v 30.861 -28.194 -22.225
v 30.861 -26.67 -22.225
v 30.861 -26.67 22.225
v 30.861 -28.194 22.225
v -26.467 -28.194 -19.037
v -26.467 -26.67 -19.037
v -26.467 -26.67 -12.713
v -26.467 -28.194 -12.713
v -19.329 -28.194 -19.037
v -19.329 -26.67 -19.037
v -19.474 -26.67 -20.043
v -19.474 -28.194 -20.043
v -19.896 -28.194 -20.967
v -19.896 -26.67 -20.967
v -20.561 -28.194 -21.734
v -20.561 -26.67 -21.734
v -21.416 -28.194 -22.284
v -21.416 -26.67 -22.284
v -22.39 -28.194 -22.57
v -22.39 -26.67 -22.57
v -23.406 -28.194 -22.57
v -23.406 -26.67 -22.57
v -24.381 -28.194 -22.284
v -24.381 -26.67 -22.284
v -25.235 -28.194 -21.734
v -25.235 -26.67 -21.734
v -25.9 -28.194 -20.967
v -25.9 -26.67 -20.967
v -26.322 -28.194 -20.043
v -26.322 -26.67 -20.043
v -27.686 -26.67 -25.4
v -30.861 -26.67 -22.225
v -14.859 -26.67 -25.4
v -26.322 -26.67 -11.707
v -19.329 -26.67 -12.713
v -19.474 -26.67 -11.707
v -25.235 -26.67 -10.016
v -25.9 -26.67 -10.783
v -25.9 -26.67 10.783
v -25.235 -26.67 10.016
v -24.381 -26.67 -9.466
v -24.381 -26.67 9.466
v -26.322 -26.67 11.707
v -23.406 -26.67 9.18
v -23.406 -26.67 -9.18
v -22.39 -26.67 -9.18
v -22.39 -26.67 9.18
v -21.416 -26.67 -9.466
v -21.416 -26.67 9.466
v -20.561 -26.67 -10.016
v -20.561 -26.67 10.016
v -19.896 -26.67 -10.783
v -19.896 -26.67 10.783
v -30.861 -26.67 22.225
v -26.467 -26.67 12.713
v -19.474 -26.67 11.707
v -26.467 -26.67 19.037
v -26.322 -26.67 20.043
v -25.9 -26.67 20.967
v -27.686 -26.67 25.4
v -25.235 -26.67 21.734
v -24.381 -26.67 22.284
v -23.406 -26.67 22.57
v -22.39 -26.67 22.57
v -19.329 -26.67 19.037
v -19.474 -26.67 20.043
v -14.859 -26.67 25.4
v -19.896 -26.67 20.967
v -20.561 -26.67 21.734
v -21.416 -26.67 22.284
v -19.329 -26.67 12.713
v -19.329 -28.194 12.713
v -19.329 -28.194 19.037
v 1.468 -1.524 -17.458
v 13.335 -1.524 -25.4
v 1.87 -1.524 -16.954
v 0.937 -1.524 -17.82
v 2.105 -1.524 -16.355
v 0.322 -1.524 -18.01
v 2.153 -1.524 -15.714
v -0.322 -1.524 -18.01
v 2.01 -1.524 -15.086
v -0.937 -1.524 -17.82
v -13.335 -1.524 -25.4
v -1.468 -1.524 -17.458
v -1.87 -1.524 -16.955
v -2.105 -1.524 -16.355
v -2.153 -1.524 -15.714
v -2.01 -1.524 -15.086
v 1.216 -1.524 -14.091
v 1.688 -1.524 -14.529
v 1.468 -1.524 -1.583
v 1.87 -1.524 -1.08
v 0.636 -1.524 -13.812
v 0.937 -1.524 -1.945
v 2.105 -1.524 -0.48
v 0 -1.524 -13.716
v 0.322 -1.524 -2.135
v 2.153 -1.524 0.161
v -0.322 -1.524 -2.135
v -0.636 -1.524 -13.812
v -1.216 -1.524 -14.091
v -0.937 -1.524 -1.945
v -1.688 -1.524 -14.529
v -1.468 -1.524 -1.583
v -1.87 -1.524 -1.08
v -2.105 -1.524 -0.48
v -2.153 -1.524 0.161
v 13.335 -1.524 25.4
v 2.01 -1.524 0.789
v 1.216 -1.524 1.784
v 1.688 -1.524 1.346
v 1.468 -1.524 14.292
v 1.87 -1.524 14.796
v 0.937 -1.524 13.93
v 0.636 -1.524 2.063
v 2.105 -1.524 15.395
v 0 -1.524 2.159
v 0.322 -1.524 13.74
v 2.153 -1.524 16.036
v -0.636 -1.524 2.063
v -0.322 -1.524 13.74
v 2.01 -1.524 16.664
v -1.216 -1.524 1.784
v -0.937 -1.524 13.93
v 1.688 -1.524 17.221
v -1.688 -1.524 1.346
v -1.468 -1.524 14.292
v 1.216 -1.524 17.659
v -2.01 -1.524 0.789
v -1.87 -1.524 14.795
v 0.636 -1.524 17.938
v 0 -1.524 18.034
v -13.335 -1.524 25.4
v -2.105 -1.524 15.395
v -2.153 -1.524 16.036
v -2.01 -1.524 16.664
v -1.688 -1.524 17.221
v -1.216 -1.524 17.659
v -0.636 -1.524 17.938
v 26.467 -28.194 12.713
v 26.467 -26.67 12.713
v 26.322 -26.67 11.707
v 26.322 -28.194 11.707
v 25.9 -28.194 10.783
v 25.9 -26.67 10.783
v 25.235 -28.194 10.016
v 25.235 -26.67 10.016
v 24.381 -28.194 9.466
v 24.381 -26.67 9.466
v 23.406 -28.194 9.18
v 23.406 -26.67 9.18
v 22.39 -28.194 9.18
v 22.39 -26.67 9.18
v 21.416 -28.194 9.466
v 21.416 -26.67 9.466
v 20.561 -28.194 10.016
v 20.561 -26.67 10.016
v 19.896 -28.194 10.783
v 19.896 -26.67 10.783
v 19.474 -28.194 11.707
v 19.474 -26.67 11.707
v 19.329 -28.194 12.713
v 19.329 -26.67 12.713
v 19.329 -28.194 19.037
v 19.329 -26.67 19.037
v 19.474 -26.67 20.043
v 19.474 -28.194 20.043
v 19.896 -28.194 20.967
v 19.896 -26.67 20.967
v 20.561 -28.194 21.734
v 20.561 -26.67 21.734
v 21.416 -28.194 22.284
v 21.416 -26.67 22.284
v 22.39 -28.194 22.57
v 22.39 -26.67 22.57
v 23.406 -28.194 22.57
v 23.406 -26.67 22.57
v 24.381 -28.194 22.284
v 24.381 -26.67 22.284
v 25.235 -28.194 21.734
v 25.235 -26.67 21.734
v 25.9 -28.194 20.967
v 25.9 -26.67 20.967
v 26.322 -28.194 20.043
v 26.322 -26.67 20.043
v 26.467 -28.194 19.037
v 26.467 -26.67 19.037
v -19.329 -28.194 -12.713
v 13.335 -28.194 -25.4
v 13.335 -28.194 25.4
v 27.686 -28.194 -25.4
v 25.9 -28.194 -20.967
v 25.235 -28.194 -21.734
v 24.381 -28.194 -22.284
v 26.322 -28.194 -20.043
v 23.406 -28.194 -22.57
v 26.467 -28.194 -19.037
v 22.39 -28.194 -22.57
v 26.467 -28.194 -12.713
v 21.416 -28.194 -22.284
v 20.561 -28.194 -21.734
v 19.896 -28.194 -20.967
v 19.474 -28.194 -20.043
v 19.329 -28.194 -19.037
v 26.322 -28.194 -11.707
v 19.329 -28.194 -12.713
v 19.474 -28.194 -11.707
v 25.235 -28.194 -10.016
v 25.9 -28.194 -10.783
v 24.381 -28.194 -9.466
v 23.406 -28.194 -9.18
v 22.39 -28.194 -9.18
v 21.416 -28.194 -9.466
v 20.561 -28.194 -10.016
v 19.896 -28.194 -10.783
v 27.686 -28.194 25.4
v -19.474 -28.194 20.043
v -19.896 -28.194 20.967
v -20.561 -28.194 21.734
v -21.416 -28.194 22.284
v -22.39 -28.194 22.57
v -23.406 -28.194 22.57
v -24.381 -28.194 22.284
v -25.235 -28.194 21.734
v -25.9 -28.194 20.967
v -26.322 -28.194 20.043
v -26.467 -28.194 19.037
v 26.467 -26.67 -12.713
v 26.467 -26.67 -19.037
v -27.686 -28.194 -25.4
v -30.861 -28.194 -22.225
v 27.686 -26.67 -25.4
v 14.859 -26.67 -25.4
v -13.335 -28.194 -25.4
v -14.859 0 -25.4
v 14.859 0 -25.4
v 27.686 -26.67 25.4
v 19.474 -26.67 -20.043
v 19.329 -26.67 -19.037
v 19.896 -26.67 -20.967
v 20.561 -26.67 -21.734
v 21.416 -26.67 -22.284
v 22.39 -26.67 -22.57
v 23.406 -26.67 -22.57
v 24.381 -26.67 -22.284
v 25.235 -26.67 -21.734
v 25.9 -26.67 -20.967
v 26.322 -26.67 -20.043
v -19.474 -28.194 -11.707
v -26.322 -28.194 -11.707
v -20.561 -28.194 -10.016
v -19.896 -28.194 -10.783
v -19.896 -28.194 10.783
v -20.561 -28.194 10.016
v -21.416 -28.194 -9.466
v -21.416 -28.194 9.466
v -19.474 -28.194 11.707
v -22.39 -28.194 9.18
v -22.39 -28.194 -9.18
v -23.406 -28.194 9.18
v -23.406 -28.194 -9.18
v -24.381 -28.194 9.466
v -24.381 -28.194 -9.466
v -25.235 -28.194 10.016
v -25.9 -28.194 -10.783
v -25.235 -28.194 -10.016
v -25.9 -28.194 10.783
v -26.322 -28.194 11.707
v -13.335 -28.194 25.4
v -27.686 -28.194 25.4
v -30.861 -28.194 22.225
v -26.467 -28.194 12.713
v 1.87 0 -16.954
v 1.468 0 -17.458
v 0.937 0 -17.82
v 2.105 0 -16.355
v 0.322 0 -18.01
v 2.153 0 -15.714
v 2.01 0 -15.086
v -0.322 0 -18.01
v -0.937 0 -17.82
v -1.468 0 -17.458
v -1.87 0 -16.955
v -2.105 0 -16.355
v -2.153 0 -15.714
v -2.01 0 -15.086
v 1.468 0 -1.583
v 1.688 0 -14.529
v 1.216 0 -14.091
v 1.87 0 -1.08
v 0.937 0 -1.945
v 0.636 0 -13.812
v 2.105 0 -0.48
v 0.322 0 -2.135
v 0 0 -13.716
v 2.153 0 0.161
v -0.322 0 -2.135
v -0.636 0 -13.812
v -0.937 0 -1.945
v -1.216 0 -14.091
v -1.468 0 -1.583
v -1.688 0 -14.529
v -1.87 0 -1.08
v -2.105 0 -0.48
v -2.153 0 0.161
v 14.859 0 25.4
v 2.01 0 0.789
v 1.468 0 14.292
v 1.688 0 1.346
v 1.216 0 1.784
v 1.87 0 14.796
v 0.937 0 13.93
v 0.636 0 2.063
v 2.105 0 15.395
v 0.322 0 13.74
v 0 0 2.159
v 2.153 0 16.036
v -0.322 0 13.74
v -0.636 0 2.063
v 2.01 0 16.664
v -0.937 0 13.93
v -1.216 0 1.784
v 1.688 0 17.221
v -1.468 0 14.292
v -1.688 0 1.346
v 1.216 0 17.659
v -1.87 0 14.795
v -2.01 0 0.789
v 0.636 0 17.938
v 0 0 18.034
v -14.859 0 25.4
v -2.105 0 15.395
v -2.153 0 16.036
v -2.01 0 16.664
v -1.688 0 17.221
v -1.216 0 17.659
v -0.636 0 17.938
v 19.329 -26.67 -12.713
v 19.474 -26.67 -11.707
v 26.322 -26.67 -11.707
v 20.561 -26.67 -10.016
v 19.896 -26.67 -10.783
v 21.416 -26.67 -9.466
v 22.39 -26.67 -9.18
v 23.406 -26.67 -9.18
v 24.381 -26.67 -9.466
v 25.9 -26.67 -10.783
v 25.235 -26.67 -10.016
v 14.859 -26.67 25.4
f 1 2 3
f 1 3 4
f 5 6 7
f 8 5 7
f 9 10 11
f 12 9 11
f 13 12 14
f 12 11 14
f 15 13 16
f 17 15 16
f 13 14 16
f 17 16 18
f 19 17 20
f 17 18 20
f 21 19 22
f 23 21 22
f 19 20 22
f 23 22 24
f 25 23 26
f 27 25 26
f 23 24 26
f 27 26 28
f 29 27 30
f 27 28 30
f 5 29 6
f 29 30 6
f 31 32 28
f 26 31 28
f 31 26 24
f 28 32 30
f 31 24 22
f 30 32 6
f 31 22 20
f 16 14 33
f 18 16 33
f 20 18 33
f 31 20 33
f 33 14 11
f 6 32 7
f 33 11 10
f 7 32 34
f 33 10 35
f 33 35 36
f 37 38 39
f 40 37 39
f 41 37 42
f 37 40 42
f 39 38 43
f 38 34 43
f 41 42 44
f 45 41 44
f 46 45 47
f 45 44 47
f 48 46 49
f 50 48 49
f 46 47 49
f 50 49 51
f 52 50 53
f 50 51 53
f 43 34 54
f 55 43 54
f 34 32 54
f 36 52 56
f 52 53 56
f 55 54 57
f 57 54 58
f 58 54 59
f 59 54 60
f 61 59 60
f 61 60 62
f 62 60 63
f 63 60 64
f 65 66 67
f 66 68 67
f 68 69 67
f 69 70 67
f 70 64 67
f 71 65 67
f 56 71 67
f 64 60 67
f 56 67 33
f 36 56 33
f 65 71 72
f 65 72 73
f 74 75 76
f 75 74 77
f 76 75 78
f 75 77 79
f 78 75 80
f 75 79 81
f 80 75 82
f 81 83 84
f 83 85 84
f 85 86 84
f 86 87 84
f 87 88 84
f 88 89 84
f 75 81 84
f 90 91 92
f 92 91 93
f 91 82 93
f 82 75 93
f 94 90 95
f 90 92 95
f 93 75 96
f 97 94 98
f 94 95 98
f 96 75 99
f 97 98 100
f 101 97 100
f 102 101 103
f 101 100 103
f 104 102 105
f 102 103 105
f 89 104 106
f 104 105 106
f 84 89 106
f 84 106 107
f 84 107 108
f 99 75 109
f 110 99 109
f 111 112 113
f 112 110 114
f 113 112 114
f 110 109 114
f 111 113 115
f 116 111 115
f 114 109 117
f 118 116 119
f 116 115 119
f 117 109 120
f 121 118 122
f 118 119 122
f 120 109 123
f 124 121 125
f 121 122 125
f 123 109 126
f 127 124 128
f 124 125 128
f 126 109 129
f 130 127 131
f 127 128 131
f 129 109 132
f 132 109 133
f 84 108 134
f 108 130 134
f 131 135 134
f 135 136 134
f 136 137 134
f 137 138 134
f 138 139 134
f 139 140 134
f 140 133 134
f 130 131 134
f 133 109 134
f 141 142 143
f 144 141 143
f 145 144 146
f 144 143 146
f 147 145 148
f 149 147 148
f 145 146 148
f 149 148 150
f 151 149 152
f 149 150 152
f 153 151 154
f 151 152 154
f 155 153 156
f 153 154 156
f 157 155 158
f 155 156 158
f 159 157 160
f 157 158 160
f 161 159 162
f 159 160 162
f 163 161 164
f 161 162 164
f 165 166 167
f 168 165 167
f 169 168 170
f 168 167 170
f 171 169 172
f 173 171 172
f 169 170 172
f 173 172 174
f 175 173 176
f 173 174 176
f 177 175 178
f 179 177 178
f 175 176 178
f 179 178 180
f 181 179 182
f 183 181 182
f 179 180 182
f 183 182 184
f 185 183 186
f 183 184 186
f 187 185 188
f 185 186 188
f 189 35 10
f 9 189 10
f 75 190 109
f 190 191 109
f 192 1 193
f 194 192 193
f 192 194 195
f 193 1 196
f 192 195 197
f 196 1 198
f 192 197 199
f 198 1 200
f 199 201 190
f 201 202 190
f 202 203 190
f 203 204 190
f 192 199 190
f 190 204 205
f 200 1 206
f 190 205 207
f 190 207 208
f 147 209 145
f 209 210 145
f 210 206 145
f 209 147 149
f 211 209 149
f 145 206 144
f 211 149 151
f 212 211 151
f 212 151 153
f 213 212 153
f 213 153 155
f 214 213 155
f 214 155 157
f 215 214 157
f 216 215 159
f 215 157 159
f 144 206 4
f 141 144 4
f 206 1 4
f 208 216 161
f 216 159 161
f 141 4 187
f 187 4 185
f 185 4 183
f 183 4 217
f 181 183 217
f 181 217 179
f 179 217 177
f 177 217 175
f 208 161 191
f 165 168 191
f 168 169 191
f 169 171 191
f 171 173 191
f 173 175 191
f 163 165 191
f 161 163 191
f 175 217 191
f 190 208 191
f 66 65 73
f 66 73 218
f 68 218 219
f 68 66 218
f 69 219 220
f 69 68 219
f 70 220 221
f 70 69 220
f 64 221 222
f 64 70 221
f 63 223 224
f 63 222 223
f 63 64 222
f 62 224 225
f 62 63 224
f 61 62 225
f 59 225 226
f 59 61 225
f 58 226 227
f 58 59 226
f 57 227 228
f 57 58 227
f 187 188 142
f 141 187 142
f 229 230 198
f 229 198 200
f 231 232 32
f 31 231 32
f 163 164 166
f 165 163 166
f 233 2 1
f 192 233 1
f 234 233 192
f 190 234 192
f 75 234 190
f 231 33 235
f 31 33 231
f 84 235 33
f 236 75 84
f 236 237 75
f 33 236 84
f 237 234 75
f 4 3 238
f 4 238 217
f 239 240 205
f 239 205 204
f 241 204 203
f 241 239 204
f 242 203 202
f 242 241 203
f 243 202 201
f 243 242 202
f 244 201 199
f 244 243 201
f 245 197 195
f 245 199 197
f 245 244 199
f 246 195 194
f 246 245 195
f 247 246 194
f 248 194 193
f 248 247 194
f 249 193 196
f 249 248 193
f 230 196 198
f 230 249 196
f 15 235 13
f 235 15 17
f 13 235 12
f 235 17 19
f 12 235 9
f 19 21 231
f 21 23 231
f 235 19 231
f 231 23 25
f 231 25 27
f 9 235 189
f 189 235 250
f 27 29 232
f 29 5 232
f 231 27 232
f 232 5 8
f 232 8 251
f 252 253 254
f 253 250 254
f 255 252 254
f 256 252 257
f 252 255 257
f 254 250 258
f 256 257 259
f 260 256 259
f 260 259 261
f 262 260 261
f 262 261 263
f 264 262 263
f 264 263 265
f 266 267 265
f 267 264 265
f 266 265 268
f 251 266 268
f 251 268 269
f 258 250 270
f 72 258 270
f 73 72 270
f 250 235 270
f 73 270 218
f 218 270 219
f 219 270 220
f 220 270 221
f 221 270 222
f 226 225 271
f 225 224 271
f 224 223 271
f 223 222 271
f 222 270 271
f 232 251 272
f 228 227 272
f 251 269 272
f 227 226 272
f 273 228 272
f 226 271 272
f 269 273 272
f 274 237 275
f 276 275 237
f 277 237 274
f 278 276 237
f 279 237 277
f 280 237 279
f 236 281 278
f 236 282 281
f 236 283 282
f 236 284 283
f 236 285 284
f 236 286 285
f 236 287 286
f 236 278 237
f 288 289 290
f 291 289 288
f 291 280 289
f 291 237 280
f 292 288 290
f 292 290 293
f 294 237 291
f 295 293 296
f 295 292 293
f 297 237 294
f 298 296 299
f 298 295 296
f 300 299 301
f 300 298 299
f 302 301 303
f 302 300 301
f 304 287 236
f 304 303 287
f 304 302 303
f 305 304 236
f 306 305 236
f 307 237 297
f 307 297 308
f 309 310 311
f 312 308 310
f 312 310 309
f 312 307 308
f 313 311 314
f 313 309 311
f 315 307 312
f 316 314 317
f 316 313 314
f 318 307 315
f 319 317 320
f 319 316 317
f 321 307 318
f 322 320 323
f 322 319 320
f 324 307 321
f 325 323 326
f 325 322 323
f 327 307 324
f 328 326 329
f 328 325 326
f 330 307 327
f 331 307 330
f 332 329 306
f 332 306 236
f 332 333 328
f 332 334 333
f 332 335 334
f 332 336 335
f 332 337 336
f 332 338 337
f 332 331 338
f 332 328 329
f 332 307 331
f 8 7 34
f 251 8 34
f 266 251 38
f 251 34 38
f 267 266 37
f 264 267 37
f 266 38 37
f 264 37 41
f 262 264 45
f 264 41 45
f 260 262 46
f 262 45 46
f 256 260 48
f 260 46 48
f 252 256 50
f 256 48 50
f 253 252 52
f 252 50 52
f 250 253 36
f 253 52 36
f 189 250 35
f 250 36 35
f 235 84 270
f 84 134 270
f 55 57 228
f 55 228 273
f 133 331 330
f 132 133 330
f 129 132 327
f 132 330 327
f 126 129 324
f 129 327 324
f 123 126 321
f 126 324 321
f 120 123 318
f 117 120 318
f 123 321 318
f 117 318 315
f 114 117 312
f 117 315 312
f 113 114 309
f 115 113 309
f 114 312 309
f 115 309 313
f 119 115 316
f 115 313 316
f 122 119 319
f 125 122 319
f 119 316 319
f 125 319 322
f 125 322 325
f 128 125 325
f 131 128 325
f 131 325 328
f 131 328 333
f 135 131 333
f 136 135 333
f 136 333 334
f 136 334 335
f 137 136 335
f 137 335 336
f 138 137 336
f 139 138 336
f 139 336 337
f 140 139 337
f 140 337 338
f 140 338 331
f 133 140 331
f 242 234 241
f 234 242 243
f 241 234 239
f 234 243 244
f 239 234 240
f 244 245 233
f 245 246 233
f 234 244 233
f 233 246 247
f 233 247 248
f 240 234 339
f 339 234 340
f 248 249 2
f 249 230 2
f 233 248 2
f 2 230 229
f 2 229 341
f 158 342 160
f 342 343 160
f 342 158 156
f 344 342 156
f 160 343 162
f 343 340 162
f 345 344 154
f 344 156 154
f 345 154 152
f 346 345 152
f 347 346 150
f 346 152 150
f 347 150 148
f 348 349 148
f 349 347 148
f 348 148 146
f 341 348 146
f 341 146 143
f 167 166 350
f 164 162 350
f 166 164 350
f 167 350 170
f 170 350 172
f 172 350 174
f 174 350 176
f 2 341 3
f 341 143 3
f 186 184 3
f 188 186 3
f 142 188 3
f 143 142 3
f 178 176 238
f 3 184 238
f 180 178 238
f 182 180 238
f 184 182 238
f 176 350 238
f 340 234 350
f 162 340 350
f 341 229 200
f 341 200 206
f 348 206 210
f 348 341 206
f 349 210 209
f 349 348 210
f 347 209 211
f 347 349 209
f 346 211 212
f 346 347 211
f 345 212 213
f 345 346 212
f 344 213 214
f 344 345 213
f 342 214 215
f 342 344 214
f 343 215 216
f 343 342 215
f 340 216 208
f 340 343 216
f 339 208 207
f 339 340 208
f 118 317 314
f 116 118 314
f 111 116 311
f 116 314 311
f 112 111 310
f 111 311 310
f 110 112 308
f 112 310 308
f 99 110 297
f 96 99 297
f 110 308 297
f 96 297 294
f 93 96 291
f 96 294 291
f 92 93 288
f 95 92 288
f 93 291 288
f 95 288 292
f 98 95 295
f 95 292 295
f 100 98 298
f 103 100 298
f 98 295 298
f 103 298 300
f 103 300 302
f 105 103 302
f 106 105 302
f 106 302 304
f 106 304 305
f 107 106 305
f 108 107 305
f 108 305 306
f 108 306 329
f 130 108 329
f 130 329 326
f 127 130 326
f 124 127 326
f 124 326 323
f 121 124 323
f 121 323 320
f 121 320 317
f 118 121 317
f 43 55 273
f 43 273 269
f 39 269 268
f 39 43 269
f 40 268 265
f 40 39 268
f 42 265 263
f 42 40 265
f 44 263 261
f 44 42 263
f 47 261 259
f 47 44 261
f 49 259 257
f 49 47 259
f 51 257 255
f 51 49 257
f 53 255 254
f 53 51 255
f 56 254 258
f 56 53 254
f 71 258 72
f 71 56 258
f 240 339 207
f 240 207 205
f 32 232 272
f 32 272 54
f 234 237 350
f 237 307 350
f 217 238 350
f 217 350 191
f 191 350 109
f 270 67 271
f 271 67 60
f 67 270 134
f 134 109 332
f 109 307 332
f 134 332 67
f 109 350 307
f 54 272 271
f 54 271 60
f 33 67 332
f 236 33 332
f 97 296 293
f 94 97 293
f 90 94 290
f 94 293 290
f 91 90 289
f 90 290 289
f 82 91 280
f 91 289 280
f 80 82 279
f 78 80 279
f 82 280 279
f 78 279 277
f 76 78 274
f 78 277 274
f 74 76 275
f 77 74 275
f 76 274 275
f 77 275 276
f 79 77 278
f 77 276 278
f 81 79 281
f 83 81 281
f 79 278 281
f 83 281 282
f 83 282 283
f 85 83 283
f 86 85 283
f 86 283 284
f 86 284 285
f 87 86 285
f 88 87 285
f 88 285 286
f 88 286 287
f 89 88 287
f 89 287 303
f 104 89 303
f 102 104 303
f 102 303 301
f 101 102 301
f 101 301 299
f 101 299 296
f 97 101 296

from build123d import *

# Parameters (mm, degrees)
BOSS_EXTRUDE1_DEPTH = 25.4
SKETCH3_R           = 2.159
CUT_EXTRUDE3_DEPTH  = 49.912809743
CUT_EXTRUDE4_DEPTH  = 49.050496574
CHAMFER1_SIZE       = 3.175


with BuildPart() as part:
    # Sketch2 → Boss-Extrude1 (new, symmetric)
    with BuildSketch(Plane.XY):
        Polygon((-14.859, 0), (-14.225031823, 0), (14.859, 0), (14.859, -26.67), (30.861, -26.67), (30.861, -28.194), (13.335, -28.194), (13.335, -1.524), (-13.335, -1.524), (-13.335, -28.194), (-30.861, -28.194), (-30.861, -26.67), (-14.859, -26.67), align=None)
    extrude(amount=BOSS_EXTRUDE1_DEPTH, both=True)

    # Sketch3 → Cut-Extrude3 (cut, through all)
    with BuildSketch(Plane(origin=(0, 0, 0), x_dir=(1, 0, 0), z_dir=(0, 1, 0))):
        with Locations(Location((0, -15.875, 0), (0, 0, 270))):
            Circle(SKETCH3_R)
        with Locations(Location((0, 15.875, 0), (0, 0, 270))):
            Circle(SKETCH3_R)
        with Locations(Location((0, 0, 0), (0, 0, 270))):
            Circle(SKETCH3_R)
    extrude(amount=-CUT_EXTRUDE3_DEPTH, mode=Mode.SUBTRACT)

    # Sketch9 → Cut-Extrude4 (cut, through all)
    with BuildSketch(Plane(origin=(0, -26.67, 0), x_dir=(1, 0, 0), z_dir=(0, 1, 0))):
        with BuildLine():
            Line((26.4668, 19.0373), (26.4668, 12.7127))
            ThreePointArc((26.4668, 12.7127), (22.8981, 9.144), (19.3294, 12.7127))
            Line((19.3294, 12.7127), (19.3294, 19.0373))
            ThreePointArc((19.3294, 19.0373), (22.8981, 22.606), (26.4668, 19.0373))
        make_face()
        with BuildLine():
            Line((-26.4668, 19.0373), (-26.4668, 12.7127))
            ThreePointArc((-26.4668, 12.7127), (-22.8981, 9.144), (-19.3294, 12.7127))
            Line((-19.3294, 12.7127), (-19.3294, 19.0373))
            ThreePointArc((-19.3294, 19.0373), (-22.8981, 22.606), (-26.4668, 19.0373))
        make_face()
        with BuildLine():
            Line((26.4668, -19.0373), (26.4668, -12.7127))
            ThreePointArc((26.4668, -12.7127), (22.8981, -9.144), (19.3294, -12.7127))
            Line((19.3294, -12.7127), (19.3294, -19.0373))
            ThreePointArc((19.3294, -19.0373), (22.8981, -22.606), (26.4668, -19.0373))
        make_face()
        with BuildLine():
            Line((-26.4668, -19.0373), (-26.4668, -12.7127))
            ThreePointArc((-26.4668, -12.7127), (-22.8981, -9.144), (-19.3294, -12.7127))
            Line((-19.3294, -12.7127), (-19.3294, -19.0373))
            ThreePointArc((-19.3294, -19.0373), (-22.8981, -22.606), (-26.4668, -19.0373))
        make_face()
    extrude(amount=-CUT_EXTRUDE4_DEPTH, mode=Mode.SUBTRACT)

    # Chamfer1
    chamfer1_edges = [part.edges().sort_by_distance(p)[0] for p in [
        (-30.861, -27.432, 25.4),
        (30.861, -27.432, -25.4),
        (-30.861, -27.432, -25.4),
        (30.861, -27.432, 25.4),
    ]]
    chamfer(chamfer1_edges, length=CHAMFER1_SIZE)


solid = part.part
